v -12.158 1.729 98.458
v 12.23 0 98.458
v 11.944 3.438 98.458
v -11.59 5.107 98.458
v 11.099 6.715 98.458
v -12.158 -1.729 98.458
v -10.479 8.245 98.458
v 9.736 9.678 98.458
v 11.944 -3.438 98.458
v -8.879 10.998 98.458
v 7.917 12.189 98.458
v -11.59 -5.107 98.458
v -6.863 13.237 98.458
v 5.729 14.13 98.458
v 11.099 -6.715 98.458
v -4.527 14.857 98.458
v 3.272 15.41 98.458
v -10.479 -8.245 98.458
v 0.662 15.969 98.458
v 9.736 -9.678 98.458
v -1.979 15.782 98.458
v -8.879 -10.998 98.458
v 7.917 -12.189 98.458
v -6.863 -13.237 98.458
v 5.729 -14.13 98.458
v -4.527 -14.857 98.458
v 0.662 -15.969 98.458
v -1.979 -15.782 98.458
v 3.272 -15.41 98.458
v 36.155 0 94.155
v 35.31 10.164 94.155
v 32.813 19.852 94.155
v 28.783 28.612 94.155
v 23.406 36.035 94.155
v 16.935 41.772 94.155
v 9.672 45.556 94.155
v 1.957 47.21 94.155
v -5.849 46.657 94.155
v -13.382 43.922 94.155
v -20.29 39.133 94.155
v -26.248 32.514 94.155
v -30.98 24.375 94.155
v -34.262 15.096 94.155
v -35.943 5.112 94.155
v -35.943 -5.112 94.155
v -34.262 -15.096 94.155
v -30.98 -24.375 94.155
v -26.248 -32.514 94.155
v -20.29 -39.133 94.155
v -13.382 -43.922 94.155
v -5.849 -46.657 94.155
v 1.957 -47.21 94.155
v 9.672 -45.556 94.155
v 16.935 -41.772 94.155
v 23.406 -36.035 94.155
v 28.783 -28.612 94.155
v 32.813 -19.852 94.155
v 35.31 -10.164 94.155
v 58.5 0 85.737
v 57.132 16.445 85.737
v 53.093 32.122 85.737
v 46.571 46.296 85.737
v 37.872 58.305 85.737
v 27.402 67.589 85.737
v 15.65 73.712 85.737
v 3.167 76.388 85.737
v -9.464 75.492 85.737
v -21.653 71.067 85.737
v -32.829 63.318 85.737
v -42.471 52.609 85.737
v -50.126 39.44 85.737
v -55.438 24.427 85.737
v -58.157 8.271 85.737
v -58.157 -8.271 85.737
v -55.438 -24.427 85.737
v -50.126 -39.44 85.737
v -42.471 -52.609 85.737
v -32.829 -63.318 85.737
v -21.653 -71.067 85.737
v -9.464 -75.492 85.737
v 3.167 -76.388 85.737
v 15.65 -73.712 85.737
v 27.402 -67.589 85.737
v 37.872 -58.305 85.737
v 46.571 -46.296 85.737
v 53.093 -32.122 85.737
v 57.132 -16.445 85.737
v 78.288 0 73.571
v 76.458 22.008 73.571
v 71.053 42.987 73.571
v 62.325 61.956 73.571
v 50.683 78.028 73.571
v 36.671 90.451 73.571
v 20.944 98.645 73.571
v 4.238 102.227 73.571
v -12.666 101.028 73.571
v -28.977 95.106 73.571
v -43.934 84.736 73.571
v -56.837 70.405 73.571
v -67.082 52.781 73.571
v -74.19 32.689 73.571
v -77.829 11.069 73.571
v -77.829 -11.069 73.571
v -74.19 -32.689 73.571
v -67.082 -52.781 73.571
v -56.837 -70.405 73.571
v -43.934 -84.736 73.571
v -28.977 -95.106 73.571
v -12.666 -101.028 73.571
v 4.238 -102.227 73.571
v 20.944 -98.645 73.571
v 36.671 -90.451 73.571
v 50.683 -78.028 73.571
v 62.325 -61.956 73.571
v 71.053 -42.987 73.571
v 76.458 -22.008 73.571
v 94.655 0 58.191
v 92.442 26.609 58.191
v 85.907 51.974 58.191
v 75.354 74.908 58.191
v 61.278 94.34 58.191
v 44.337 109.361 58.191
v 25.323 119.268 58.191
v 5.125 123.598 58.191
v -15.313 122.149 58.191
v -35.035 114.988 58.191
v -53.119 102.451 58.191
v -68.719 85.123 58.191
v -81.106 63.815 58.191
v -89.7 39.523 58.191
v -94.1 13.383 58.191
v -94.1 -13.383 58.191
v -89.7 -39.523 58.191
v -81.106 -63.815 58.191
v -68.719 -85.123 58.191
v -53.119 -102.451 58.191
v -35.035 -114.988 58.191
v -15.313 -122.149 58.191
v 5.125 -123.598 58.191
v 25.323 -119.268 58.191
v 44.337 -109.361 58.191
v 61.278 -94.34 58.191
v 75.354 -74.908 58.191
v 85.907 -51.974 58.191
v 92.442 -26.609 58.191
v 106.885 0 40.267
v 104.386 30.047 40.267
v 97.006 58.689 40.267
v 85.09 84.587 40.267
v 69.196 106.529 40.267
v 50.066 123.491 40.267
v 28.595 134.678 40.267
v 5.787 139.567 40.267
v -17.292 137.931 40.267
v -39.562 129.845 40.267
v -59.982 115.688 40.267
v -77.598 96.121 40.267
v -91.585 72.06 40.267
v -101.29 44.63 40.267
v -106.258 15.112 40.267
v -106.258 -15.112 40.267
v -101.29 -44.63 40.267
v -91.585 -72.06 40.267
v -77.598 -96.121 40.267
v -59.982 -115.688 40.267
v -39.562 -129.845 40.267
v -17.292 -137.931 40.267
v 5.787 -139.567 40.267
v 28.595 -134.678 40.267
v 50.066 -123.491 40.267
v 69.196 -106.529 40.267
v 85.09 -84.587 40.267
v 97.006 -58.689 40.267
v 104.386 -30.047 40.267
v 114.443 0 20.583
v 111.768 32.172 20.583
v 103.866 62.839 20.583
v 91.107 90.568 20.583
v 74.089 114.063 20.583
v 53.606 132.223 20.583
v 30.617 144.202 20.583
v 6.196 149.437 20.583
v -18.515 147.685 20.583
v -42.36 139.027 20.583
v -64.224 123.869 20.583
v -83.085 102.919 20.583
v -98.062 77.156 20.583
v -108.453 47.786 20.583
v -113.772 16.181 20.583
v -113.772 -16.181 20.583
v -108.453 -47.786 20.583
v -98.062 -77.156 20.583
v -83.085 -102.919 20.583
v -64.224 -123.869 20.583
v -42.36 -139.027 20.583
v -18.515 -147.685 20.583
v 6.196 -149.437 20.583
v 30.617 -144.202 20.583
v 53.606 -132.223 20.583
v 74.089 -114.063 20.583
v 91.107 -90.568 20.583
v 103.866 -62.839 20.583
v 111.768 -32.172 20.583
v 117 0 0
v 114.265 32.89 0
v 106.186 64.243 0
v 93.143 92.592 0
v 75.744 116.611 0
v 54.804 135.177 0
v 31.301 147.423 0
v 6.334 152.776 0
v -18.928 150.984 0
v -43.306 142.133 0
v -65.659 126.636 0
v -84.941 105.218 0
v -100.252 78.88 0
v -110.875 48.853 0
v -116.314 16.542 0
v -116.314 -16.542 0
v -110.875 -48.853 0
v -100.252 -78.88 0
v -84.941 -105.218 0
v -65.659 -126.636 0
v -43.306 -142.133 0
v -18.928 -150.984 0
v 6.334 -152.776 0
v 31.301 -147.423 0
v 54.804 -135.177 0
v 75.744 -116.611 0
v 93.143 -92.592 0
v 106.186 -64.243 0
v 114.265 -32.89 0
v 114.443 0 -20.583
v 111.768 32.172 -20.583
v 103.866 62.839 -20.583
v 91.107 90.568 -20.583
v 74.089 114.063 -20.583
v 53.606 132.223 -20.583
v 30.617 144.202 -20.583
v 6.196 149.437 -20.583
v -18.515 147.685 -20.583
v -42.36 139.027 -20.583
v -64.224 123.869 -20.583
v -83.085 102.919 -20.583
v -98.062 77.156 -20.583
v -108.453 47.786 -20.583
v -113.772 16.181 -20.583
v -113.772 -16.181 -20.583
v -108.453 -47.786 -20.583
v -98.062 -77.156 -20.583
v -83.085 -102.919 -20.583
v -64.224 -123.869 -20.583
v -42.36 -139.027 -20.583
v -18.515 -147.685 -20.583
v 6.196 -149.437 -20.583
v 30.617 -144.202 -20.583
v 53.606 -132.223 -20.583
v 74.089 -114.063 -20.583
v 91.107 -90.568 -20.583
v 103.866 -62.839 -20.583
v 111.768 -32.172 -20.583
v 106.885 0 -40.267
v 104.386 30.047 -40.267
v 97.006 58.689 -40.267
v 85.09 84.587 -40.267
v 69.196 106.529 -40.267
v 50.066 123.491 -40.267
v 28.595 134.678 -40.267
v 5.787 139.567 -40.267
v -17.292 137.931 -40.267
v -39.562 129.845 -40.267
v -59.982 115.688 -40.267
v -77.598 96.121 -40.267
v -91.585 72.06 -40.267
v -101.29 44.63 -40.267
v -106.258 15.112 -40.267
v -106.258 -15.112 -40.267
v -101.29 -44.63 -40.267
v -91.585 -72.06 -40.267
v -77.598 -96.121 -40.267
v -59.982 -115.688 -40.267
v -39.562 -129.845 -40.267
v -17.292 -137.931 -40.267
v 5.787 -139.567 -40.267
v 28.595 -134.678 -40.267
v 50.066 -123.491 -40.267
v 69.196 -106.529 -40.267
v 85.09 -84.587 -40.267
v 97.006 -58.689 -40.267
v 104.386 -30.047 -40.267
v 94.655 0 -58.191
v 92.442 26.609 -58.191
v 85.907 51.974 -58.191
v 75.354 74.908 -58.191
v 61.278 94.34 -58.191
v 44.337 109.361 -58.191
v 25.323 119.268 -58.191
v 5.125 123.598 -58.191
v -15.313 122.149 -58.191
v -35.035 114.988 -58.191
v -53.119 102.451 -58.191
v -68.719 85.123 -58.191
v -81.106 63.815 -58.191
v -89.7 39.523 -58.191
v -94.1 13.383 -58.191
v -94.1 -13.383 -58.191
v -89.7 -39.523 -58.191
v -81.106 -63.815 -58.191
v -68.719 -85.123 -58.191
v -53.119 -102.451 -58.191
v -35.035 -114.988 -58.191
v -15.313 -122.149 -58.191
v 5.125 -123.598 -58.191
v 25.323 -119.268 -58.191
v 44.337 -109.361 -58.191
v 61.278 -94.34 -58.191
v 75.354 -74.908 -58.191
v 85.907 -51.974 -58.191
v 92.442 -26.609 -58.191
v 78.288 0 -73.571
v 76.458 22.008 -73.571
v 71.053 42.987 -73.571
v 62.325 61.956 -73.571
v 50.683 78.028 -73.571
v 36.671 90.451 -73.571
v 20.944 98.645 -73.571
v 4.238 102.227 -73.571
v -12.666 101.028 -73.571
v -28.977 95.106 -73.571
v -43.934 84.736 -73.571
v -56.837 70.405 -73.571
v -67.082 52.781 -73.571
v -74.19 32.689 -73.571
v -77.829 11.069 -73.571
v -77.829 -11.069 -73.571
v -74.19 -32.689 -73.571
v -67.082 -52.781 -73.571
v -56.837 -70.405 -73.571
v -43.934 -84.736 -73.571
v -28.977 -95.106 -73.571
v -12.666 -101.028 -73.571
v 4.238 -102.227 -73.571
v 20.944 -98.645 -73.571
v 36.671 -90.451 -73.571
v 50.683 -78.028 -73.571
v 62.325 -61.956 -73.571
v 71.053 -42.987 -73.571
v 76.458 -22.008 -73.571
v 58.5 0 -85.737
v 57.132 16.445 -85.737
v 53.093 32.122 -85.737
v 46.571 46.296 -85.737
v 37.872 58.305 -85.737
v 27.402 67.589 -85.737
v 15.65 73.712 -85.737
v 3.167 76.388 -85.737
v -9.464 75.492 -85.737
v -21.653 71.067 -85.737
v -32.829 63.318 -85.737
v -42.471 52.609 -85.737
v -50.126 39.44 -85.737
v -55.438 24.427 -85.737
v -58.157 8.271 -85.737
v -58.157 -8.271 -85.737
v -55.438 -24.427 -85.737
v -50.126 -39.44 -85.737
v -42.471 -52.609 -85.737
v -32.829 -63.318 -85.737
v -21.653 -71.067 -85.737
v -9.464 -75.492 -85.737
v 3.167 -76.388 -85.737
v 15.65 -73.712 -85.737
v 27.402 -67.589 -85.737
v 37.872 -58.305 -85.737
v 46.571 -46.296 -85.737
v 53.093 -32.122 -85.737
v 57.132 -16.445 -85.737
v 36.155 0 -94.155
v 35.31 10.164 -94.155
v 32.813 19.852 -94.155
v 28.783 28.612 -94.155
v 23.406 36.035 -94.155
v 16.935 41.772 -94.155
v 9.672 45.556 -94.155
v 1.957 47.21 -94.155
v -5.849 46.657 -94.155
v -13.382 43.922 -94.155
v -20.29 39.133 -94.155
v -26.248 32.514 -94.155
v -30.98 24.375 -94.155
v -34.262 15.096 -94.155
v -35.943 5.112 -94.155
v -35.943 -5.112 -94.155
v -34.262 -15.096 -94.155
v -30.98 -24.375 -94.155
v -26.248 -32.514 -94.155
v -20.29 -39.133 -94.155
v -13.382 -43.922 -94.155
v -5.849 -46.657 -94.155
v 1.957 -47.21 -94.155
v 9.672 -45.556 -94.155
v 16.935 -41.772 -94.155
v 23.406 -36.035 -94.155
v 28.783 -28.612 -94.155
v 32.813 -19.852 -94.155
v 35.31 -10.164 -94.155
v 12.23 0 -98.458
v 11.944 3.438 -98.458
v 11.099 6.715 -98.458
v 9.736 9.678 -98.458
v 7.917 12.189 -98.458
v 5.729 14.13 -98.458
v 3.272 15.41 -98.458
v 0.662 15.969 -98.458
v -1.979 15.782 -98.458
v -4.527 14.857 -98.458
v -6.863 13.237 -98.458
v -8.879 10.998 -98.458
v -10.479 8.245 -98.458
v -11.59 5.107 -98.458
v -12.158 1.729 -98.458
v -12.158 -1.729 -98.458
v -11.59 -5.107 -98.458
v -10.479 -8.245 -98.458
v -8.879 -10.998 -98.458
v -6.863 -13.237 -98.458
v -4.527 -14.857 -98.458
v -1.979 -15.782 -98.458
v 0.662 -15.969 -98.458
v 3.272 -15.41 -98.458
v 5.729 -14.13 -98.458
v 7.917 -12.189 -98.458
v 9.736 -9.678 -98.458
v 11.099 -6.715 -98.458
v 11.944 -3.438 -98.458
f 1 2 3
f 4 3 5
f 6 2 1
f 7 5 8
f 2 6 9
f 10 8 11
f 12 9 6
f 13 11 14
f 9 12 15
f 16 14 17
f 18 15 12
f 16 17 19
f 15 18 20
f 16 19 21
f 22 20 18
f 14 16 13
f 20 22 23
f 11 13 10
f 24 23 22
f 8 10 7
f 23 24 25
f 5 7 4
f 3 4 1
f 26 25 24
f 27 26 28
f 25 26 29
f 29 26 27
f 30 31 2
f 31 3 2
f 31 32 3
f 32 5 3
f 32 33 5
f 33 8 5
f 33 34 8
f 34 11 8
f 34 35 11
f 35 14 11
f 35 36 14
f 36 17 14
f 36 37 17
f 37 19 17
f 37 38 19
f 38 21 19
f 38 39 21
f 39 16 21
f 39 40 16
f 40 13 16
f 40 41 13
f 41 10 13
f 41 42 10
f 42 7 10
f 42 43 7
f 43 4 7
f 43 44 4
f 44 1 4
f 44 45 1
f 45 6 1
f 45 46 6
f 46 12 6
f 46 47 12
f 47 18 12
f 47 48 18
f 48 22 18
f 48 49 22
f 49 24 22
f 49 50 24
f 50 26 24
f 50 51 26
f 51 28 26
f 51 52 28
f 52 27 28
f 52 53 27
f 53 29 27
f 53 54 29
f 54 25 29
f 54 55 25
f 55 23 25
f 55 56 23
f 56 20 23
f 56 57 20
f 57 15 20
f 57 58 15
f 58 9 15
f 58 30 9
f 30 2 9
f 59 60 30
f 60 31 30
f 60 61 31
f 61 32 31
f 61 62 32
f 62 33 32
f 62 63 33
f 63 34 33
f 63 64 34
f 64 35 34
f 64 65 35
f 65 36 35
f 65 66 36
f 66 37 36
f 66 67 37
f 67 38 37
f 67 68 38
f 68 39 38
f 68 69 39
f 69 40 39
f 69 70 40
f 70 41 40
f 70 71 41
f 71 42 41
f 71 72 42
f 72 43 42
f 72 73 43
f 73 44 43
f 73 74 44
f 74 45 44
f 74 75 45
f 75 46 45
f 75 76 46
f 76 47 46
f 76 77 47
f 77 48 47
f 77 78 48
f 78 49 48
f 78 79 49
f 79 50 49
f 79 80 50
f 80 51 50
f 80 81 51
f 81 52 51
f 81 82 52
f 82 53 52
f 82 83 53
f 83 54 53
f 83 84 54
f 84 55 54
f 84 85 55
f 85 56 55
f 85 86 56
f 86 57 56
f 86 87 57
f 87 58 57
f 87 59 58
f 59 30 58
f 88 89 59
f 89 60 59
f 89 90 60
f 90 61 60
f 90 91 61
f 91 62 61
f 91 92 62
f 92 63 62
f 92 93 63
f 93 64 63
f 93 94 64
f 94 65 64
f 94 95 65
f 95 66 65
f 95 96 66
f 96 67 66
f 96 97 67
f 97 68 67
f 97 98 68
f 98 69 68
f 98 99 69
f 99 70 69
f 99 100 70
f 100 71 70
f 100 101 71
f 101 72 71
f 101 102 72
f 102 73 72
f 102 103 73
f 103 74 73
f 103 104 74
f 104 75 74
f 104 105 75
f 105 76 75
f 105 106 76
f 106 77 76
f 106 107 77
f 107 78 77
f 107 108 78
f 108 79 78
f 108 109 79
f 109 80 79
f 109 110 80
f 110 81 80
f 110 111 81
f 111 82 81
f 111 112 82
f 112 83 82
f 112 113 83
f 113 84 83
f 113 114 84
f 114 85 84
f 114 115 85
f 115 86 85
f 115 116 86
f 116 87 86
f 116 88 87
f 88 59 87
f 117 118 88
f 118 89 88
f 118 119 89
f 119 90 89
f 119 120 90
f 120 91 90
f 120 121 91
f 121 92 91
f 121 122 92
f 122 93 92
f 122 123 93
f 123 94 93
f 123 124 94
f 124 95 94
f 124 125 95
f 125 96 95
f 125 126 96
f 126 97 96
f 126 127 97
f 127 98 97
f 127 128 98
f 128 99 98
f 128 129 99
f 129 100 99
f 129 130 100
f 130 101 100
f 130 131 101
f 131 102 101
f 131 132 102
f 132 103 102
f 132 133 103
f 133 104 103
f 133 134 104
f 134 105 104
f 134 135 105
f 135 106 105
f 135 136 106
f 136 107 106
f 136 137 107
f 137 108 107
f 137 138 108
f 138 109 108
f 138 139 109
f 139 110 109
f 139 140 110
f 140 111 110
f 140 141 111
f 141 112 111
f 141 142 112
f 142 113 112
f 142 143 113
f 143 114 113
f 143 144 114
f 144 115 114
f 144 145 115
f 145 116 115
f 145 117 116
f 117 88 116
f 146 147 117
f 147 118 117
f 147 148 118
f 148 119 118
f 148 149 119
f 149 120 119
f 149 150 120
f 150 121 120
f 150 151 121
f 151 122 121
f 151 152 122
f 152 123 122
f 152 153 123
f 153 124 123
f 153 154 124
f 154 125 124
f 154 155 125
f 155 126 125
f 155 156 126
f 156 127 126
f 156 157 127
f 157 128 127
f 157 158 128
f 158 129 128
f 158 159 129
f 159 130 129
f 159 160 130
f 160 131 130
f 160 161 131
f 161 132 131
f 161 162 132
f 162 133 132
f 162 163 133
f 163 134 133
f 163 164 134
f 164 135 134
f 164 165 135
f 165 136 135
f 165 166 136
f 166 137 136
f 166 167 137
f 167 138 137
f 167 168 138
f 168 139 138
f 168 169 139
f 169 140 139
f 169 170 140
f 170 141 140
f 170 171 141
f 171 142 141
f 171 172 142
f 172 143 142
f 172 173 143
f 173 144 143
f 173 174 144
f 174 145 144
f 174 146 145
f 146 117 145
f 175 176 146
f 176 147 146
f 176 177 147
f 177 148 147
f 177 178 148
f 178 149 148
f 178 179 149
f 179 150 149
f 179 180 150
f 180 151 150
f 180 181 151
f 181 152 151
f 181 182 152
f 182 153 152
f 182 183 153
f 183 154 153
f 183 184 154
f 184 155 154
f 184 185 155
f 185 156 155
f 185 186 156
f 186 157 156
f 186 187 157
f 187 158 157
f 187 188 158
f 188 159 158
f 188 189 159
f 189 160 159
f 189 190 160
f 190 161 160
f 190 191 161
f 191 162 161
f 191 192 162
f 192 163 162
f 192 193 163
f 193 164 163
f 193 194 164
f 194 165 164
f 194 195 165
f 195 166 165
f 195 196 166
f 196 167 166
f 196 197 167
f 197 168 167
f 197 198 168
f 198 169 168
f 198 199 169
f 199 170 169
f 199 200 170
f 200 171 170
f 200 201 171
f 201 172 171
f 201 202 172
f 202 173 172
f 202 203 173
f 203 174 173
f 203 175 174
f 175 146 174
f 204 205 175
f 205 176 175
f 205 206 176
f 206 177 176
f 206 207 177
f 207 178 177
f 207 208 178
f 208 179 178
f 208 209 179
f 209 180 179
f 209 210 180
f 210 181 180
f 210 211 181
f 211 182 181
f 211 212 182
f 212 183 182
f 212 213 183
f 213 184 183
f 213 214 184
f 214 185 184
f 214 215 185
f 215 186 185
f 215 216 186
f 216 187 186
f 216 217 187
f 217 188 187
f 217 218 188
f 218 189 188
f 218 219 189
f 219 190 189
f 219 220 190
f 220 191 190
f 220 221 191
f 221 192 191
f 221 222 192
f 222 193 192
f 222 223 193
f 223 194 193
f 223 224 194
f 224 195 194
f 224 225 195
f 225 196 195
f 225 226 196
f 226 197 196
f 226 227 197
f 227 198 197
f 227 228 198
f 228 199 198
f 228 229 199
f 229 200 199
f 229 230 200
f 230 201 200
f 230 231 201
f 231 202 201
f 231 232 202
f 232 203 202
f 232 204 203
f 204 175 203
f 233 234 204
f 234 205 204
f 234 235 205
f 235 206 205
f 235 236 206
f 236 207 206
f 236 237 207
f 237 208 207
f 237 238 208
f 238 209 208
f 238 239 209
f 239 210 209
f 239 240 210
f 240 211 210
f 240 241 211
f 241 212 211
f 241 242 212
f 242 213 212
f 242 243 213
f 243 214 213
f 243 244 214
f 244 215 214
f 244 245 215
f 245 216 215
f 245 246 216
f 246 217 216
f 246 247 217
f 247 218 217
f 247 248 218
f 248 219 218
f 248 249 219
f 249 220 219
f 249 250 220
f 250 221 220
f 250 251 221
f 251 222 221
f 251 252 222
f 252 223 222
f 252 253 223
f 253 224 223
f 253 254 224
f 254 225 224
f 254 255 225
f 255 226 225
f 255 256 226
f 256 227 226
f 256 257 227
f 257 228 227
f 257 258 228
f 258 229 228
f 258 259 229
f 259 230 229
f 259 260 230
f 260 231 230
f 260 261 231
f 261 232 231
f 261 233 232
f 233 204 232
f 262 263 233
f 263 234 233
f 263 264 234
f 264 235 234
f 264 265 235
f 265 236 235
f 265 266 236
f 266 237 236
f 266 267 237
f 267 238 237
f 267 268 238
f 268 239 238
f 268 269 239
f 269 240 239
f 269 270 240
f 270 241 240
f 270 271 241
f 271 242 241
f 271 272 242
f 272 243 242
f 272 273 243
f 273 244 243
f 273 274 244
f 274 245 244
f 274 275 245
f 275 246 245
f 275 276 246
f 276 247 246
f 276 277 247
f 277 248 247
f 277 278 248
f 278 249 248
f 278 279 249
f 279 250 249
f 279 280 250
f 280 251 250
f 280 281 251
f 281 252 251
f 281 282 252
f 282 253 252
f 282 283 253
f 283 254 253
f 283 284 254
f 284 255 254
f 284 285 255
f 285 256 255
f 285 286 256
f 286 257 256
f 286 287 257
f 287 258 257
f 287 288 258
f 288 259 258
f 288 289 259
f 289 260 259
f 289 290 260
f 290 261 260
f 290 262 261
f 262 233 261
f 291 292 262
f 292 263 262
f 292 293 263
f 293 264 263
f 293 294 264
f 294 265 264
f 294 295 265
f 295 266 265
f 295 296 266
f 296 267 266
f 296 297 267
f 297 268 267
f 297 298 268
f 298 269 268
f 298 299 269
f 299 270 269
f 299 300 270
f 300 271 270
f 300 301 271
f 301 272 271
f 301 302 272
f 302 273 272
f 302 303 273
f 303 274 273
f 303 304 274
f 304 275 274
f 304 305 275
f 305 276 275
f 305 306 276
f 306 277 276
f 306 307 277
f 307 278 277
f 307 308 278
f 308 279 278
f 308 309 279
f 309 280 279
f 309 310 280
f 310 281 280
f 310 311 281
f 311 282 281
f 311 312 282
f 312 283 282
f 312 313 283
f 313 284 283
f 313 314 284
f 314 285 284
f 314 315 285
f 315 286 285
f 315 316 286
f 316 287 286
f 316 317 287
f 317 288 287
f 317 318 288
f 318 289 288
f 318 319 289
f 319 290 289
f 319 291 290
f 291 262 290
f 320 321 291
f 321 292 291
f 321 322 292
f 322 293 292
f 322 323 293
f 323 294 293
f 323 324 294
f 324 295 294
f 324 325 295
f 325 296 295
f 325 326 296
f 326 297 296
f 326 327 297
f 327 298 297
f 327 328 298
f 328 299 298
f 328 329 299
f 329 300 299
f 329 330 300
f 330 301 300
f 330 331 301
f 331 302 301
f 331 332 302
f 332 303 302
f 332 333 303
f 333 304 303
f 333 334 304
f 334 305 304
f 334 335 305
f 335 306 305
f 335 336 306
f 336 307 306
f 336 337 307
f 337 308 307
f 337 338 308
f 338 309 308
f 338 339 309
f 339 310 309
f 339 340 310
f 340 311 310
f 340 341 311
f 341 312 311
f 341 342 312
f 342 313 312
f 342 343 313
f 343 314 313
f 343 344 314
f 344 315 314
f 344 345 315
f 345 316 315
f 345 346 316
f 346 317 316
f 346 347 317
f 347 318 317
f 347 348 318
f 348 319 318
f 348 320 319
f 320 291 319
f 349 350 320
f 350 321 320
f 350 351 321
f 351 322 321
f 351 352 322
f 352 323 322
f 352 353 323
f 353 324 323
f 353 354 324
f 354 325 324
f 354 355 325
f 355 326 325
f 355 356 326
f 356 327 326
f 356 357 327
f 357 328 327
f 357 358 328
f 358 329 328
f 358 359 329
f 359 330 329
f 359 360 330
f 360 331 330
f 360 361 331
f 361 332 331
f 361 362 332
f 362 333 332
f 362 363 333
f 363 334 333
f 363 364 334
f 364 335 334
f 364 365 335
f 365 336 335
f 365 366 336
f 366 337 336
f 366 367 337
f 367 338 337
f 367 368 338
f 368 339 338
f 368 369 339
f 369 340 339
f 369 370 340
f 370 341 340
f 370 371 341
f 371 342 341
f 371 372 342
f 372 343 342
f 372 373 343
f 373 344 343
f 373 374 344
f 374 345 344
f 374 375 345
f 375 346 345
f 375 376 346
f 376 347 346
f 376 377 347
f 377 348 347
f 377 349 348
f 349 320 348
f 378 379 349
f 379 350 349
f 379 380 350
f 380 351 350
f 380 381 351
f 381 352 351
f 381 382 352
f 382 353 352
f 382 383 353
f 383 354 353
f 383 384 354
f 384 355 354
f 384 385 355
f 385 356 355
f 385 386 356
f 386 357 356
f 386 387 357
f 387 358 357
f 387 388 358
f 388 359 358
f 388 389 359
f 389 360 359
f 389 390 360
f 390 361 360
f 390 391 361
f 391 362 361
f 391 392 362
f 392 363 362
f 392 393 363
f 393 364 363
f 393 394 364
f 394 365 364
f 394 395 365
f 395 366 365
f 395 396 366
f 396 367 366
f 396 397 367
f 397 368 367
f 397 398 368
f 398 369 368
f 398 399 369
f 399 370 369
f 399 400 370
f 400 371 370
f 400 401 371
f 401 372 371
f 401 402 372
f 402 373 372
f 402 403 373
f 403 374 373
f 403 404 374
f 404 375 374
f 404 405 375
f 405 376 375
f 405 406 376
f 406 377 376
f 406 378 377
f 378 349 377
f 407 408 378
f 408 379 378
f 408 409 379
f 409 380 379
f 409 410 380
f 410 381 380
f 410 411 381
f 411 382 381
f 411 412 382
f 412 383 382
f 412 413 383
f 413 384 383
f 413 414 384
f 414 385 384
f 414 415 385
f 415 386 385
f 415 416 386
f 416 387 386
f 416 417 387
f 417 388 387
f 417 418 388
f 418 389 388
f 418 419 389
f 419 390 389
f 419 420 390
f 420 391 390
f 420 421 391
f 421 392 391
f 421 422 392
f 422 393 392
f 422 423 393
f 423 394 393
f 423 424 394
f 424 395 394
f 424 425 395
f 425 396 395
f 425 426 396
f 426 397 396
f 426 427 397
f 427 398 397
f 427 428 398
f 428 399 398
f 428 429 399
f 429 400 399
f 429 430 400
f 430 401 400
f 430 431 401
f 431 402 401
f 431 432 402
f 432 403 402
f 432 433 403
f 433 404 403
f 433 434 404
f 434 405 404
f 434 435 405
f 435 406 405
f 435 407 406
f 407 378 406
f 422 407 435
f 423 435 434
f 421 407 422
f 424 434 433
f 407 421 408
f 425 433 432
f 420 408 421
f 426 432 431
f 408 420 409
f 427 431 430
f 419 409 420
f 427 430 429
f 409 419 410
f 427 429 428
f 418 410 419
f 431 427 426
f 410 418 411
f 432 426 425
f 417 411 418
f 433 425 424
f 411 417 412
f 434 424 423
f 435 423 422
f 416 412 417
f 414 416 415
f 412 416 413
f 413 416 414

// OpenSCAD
// Generated by SolidPython 1.0.1 on 2020-07-29 00:46:51


scale(v = [13, 17, 11]) {
	sphere(r = 9);
}
/***********************************************
*********      SolidPython code:      **********
************************************************
 
# import packages: SolidPython
from solid import *
from solid.utils import *
from itertools import chain, combinations, permutations


class Resize:

    def __init__(self, scad_file):
        self.scad_file = scad_file
        #self.scad_file = import_scad(scad_file)
        # cone/cylinder param:
        self.r1 = 0
        self.r2 = 0
        self.h = 0
        # rectangular prism param:
        self.w = 0
        self.l = 0
        # ellipse param:
        self.r = 0

    # import OpenScad code (file name corresponds to shape)


    # classify shape + parameters
    def assign(self, param1, param2, param3):
        if self.scad_file == 'cone.scad':
            self.r1 = param1
            self.r2 = param2
            self.h = param3
        elif self.scad_file == 'cylinder.scad':
            self.r1 = param1
            self.r2 = param2
            self.h = param3
        elif self.scad_file == 'rectangularPrism.scad':
            self.h = param1
            self.l = param2
            self.w = param3
        else:
            self.r = param1
            self.h = param2

    # resize parameters
    def iterate(self):
        x = range(3, 20, 2)
        i = 1
        if self.scad_file == 'cone.scad':
            tempList = list(permutations(x, 2))
            for temp in tempList:
                param1 = temp[0]
                param2 = temp[1]
                filepath = 'produced_scad_files/' + 'cone' + str(param1) + '_' + str(param2) + '_' + '.scad'
                scad_render_to_file(cylinder(h=param1, r1=param2, r2=0), filepath)

        elif self.scad_file == 'cylinder.scad':
            tempList = list(permutations(x, 3))
            for temp in tempList:
                param1 = temp[0]
                param2 = temp[1]
                filepath = 'produced_scad_files/' + 'cylinder' + str(param1) + '_' + str(param2) + '_' + '.scad'
                scad_render_to_file(cylinder(h=param1, r1=param2, r2=param2), filepath)

        elif self.scad_file == 'rectangularPrism.scad':
            tempList = list(permutations(x, 3))
            for temp in tempList:
                param1 = temp[0]
                param2 = temp[1]
                param3 = temp[2]
                filepath = 'produced_scad_files/' + 'rectangularPrism' + str(param1) + '_' + str(param2) + '_' + str(
                    param3) + '.scad'
                scad_render_to_file(cube(size=(param1, param2, param3)), filepath)

        elif self.scad_file == 'ellipse.scad':
            tempList = list(permutations(x, 4))
            for temp in tempList:
                param1 = temp[0]
                param2 = temp[1]
                param3 = temp[2]
                param4 = temp[3]
                filepath = 'produced_scad_files/' + 'ellipse' + str(param1) + '_' + str(param2) + '_' + str(param3) + '_' + str(param4) + '.scad'
                scad_render_to_file(scale([param1, param2, param3])(sphere(r=param4)), filepath)

    def render_to_scadfile(self):
        scad_render_to_file(scad, 'example.scad') 
 
************************************************/
